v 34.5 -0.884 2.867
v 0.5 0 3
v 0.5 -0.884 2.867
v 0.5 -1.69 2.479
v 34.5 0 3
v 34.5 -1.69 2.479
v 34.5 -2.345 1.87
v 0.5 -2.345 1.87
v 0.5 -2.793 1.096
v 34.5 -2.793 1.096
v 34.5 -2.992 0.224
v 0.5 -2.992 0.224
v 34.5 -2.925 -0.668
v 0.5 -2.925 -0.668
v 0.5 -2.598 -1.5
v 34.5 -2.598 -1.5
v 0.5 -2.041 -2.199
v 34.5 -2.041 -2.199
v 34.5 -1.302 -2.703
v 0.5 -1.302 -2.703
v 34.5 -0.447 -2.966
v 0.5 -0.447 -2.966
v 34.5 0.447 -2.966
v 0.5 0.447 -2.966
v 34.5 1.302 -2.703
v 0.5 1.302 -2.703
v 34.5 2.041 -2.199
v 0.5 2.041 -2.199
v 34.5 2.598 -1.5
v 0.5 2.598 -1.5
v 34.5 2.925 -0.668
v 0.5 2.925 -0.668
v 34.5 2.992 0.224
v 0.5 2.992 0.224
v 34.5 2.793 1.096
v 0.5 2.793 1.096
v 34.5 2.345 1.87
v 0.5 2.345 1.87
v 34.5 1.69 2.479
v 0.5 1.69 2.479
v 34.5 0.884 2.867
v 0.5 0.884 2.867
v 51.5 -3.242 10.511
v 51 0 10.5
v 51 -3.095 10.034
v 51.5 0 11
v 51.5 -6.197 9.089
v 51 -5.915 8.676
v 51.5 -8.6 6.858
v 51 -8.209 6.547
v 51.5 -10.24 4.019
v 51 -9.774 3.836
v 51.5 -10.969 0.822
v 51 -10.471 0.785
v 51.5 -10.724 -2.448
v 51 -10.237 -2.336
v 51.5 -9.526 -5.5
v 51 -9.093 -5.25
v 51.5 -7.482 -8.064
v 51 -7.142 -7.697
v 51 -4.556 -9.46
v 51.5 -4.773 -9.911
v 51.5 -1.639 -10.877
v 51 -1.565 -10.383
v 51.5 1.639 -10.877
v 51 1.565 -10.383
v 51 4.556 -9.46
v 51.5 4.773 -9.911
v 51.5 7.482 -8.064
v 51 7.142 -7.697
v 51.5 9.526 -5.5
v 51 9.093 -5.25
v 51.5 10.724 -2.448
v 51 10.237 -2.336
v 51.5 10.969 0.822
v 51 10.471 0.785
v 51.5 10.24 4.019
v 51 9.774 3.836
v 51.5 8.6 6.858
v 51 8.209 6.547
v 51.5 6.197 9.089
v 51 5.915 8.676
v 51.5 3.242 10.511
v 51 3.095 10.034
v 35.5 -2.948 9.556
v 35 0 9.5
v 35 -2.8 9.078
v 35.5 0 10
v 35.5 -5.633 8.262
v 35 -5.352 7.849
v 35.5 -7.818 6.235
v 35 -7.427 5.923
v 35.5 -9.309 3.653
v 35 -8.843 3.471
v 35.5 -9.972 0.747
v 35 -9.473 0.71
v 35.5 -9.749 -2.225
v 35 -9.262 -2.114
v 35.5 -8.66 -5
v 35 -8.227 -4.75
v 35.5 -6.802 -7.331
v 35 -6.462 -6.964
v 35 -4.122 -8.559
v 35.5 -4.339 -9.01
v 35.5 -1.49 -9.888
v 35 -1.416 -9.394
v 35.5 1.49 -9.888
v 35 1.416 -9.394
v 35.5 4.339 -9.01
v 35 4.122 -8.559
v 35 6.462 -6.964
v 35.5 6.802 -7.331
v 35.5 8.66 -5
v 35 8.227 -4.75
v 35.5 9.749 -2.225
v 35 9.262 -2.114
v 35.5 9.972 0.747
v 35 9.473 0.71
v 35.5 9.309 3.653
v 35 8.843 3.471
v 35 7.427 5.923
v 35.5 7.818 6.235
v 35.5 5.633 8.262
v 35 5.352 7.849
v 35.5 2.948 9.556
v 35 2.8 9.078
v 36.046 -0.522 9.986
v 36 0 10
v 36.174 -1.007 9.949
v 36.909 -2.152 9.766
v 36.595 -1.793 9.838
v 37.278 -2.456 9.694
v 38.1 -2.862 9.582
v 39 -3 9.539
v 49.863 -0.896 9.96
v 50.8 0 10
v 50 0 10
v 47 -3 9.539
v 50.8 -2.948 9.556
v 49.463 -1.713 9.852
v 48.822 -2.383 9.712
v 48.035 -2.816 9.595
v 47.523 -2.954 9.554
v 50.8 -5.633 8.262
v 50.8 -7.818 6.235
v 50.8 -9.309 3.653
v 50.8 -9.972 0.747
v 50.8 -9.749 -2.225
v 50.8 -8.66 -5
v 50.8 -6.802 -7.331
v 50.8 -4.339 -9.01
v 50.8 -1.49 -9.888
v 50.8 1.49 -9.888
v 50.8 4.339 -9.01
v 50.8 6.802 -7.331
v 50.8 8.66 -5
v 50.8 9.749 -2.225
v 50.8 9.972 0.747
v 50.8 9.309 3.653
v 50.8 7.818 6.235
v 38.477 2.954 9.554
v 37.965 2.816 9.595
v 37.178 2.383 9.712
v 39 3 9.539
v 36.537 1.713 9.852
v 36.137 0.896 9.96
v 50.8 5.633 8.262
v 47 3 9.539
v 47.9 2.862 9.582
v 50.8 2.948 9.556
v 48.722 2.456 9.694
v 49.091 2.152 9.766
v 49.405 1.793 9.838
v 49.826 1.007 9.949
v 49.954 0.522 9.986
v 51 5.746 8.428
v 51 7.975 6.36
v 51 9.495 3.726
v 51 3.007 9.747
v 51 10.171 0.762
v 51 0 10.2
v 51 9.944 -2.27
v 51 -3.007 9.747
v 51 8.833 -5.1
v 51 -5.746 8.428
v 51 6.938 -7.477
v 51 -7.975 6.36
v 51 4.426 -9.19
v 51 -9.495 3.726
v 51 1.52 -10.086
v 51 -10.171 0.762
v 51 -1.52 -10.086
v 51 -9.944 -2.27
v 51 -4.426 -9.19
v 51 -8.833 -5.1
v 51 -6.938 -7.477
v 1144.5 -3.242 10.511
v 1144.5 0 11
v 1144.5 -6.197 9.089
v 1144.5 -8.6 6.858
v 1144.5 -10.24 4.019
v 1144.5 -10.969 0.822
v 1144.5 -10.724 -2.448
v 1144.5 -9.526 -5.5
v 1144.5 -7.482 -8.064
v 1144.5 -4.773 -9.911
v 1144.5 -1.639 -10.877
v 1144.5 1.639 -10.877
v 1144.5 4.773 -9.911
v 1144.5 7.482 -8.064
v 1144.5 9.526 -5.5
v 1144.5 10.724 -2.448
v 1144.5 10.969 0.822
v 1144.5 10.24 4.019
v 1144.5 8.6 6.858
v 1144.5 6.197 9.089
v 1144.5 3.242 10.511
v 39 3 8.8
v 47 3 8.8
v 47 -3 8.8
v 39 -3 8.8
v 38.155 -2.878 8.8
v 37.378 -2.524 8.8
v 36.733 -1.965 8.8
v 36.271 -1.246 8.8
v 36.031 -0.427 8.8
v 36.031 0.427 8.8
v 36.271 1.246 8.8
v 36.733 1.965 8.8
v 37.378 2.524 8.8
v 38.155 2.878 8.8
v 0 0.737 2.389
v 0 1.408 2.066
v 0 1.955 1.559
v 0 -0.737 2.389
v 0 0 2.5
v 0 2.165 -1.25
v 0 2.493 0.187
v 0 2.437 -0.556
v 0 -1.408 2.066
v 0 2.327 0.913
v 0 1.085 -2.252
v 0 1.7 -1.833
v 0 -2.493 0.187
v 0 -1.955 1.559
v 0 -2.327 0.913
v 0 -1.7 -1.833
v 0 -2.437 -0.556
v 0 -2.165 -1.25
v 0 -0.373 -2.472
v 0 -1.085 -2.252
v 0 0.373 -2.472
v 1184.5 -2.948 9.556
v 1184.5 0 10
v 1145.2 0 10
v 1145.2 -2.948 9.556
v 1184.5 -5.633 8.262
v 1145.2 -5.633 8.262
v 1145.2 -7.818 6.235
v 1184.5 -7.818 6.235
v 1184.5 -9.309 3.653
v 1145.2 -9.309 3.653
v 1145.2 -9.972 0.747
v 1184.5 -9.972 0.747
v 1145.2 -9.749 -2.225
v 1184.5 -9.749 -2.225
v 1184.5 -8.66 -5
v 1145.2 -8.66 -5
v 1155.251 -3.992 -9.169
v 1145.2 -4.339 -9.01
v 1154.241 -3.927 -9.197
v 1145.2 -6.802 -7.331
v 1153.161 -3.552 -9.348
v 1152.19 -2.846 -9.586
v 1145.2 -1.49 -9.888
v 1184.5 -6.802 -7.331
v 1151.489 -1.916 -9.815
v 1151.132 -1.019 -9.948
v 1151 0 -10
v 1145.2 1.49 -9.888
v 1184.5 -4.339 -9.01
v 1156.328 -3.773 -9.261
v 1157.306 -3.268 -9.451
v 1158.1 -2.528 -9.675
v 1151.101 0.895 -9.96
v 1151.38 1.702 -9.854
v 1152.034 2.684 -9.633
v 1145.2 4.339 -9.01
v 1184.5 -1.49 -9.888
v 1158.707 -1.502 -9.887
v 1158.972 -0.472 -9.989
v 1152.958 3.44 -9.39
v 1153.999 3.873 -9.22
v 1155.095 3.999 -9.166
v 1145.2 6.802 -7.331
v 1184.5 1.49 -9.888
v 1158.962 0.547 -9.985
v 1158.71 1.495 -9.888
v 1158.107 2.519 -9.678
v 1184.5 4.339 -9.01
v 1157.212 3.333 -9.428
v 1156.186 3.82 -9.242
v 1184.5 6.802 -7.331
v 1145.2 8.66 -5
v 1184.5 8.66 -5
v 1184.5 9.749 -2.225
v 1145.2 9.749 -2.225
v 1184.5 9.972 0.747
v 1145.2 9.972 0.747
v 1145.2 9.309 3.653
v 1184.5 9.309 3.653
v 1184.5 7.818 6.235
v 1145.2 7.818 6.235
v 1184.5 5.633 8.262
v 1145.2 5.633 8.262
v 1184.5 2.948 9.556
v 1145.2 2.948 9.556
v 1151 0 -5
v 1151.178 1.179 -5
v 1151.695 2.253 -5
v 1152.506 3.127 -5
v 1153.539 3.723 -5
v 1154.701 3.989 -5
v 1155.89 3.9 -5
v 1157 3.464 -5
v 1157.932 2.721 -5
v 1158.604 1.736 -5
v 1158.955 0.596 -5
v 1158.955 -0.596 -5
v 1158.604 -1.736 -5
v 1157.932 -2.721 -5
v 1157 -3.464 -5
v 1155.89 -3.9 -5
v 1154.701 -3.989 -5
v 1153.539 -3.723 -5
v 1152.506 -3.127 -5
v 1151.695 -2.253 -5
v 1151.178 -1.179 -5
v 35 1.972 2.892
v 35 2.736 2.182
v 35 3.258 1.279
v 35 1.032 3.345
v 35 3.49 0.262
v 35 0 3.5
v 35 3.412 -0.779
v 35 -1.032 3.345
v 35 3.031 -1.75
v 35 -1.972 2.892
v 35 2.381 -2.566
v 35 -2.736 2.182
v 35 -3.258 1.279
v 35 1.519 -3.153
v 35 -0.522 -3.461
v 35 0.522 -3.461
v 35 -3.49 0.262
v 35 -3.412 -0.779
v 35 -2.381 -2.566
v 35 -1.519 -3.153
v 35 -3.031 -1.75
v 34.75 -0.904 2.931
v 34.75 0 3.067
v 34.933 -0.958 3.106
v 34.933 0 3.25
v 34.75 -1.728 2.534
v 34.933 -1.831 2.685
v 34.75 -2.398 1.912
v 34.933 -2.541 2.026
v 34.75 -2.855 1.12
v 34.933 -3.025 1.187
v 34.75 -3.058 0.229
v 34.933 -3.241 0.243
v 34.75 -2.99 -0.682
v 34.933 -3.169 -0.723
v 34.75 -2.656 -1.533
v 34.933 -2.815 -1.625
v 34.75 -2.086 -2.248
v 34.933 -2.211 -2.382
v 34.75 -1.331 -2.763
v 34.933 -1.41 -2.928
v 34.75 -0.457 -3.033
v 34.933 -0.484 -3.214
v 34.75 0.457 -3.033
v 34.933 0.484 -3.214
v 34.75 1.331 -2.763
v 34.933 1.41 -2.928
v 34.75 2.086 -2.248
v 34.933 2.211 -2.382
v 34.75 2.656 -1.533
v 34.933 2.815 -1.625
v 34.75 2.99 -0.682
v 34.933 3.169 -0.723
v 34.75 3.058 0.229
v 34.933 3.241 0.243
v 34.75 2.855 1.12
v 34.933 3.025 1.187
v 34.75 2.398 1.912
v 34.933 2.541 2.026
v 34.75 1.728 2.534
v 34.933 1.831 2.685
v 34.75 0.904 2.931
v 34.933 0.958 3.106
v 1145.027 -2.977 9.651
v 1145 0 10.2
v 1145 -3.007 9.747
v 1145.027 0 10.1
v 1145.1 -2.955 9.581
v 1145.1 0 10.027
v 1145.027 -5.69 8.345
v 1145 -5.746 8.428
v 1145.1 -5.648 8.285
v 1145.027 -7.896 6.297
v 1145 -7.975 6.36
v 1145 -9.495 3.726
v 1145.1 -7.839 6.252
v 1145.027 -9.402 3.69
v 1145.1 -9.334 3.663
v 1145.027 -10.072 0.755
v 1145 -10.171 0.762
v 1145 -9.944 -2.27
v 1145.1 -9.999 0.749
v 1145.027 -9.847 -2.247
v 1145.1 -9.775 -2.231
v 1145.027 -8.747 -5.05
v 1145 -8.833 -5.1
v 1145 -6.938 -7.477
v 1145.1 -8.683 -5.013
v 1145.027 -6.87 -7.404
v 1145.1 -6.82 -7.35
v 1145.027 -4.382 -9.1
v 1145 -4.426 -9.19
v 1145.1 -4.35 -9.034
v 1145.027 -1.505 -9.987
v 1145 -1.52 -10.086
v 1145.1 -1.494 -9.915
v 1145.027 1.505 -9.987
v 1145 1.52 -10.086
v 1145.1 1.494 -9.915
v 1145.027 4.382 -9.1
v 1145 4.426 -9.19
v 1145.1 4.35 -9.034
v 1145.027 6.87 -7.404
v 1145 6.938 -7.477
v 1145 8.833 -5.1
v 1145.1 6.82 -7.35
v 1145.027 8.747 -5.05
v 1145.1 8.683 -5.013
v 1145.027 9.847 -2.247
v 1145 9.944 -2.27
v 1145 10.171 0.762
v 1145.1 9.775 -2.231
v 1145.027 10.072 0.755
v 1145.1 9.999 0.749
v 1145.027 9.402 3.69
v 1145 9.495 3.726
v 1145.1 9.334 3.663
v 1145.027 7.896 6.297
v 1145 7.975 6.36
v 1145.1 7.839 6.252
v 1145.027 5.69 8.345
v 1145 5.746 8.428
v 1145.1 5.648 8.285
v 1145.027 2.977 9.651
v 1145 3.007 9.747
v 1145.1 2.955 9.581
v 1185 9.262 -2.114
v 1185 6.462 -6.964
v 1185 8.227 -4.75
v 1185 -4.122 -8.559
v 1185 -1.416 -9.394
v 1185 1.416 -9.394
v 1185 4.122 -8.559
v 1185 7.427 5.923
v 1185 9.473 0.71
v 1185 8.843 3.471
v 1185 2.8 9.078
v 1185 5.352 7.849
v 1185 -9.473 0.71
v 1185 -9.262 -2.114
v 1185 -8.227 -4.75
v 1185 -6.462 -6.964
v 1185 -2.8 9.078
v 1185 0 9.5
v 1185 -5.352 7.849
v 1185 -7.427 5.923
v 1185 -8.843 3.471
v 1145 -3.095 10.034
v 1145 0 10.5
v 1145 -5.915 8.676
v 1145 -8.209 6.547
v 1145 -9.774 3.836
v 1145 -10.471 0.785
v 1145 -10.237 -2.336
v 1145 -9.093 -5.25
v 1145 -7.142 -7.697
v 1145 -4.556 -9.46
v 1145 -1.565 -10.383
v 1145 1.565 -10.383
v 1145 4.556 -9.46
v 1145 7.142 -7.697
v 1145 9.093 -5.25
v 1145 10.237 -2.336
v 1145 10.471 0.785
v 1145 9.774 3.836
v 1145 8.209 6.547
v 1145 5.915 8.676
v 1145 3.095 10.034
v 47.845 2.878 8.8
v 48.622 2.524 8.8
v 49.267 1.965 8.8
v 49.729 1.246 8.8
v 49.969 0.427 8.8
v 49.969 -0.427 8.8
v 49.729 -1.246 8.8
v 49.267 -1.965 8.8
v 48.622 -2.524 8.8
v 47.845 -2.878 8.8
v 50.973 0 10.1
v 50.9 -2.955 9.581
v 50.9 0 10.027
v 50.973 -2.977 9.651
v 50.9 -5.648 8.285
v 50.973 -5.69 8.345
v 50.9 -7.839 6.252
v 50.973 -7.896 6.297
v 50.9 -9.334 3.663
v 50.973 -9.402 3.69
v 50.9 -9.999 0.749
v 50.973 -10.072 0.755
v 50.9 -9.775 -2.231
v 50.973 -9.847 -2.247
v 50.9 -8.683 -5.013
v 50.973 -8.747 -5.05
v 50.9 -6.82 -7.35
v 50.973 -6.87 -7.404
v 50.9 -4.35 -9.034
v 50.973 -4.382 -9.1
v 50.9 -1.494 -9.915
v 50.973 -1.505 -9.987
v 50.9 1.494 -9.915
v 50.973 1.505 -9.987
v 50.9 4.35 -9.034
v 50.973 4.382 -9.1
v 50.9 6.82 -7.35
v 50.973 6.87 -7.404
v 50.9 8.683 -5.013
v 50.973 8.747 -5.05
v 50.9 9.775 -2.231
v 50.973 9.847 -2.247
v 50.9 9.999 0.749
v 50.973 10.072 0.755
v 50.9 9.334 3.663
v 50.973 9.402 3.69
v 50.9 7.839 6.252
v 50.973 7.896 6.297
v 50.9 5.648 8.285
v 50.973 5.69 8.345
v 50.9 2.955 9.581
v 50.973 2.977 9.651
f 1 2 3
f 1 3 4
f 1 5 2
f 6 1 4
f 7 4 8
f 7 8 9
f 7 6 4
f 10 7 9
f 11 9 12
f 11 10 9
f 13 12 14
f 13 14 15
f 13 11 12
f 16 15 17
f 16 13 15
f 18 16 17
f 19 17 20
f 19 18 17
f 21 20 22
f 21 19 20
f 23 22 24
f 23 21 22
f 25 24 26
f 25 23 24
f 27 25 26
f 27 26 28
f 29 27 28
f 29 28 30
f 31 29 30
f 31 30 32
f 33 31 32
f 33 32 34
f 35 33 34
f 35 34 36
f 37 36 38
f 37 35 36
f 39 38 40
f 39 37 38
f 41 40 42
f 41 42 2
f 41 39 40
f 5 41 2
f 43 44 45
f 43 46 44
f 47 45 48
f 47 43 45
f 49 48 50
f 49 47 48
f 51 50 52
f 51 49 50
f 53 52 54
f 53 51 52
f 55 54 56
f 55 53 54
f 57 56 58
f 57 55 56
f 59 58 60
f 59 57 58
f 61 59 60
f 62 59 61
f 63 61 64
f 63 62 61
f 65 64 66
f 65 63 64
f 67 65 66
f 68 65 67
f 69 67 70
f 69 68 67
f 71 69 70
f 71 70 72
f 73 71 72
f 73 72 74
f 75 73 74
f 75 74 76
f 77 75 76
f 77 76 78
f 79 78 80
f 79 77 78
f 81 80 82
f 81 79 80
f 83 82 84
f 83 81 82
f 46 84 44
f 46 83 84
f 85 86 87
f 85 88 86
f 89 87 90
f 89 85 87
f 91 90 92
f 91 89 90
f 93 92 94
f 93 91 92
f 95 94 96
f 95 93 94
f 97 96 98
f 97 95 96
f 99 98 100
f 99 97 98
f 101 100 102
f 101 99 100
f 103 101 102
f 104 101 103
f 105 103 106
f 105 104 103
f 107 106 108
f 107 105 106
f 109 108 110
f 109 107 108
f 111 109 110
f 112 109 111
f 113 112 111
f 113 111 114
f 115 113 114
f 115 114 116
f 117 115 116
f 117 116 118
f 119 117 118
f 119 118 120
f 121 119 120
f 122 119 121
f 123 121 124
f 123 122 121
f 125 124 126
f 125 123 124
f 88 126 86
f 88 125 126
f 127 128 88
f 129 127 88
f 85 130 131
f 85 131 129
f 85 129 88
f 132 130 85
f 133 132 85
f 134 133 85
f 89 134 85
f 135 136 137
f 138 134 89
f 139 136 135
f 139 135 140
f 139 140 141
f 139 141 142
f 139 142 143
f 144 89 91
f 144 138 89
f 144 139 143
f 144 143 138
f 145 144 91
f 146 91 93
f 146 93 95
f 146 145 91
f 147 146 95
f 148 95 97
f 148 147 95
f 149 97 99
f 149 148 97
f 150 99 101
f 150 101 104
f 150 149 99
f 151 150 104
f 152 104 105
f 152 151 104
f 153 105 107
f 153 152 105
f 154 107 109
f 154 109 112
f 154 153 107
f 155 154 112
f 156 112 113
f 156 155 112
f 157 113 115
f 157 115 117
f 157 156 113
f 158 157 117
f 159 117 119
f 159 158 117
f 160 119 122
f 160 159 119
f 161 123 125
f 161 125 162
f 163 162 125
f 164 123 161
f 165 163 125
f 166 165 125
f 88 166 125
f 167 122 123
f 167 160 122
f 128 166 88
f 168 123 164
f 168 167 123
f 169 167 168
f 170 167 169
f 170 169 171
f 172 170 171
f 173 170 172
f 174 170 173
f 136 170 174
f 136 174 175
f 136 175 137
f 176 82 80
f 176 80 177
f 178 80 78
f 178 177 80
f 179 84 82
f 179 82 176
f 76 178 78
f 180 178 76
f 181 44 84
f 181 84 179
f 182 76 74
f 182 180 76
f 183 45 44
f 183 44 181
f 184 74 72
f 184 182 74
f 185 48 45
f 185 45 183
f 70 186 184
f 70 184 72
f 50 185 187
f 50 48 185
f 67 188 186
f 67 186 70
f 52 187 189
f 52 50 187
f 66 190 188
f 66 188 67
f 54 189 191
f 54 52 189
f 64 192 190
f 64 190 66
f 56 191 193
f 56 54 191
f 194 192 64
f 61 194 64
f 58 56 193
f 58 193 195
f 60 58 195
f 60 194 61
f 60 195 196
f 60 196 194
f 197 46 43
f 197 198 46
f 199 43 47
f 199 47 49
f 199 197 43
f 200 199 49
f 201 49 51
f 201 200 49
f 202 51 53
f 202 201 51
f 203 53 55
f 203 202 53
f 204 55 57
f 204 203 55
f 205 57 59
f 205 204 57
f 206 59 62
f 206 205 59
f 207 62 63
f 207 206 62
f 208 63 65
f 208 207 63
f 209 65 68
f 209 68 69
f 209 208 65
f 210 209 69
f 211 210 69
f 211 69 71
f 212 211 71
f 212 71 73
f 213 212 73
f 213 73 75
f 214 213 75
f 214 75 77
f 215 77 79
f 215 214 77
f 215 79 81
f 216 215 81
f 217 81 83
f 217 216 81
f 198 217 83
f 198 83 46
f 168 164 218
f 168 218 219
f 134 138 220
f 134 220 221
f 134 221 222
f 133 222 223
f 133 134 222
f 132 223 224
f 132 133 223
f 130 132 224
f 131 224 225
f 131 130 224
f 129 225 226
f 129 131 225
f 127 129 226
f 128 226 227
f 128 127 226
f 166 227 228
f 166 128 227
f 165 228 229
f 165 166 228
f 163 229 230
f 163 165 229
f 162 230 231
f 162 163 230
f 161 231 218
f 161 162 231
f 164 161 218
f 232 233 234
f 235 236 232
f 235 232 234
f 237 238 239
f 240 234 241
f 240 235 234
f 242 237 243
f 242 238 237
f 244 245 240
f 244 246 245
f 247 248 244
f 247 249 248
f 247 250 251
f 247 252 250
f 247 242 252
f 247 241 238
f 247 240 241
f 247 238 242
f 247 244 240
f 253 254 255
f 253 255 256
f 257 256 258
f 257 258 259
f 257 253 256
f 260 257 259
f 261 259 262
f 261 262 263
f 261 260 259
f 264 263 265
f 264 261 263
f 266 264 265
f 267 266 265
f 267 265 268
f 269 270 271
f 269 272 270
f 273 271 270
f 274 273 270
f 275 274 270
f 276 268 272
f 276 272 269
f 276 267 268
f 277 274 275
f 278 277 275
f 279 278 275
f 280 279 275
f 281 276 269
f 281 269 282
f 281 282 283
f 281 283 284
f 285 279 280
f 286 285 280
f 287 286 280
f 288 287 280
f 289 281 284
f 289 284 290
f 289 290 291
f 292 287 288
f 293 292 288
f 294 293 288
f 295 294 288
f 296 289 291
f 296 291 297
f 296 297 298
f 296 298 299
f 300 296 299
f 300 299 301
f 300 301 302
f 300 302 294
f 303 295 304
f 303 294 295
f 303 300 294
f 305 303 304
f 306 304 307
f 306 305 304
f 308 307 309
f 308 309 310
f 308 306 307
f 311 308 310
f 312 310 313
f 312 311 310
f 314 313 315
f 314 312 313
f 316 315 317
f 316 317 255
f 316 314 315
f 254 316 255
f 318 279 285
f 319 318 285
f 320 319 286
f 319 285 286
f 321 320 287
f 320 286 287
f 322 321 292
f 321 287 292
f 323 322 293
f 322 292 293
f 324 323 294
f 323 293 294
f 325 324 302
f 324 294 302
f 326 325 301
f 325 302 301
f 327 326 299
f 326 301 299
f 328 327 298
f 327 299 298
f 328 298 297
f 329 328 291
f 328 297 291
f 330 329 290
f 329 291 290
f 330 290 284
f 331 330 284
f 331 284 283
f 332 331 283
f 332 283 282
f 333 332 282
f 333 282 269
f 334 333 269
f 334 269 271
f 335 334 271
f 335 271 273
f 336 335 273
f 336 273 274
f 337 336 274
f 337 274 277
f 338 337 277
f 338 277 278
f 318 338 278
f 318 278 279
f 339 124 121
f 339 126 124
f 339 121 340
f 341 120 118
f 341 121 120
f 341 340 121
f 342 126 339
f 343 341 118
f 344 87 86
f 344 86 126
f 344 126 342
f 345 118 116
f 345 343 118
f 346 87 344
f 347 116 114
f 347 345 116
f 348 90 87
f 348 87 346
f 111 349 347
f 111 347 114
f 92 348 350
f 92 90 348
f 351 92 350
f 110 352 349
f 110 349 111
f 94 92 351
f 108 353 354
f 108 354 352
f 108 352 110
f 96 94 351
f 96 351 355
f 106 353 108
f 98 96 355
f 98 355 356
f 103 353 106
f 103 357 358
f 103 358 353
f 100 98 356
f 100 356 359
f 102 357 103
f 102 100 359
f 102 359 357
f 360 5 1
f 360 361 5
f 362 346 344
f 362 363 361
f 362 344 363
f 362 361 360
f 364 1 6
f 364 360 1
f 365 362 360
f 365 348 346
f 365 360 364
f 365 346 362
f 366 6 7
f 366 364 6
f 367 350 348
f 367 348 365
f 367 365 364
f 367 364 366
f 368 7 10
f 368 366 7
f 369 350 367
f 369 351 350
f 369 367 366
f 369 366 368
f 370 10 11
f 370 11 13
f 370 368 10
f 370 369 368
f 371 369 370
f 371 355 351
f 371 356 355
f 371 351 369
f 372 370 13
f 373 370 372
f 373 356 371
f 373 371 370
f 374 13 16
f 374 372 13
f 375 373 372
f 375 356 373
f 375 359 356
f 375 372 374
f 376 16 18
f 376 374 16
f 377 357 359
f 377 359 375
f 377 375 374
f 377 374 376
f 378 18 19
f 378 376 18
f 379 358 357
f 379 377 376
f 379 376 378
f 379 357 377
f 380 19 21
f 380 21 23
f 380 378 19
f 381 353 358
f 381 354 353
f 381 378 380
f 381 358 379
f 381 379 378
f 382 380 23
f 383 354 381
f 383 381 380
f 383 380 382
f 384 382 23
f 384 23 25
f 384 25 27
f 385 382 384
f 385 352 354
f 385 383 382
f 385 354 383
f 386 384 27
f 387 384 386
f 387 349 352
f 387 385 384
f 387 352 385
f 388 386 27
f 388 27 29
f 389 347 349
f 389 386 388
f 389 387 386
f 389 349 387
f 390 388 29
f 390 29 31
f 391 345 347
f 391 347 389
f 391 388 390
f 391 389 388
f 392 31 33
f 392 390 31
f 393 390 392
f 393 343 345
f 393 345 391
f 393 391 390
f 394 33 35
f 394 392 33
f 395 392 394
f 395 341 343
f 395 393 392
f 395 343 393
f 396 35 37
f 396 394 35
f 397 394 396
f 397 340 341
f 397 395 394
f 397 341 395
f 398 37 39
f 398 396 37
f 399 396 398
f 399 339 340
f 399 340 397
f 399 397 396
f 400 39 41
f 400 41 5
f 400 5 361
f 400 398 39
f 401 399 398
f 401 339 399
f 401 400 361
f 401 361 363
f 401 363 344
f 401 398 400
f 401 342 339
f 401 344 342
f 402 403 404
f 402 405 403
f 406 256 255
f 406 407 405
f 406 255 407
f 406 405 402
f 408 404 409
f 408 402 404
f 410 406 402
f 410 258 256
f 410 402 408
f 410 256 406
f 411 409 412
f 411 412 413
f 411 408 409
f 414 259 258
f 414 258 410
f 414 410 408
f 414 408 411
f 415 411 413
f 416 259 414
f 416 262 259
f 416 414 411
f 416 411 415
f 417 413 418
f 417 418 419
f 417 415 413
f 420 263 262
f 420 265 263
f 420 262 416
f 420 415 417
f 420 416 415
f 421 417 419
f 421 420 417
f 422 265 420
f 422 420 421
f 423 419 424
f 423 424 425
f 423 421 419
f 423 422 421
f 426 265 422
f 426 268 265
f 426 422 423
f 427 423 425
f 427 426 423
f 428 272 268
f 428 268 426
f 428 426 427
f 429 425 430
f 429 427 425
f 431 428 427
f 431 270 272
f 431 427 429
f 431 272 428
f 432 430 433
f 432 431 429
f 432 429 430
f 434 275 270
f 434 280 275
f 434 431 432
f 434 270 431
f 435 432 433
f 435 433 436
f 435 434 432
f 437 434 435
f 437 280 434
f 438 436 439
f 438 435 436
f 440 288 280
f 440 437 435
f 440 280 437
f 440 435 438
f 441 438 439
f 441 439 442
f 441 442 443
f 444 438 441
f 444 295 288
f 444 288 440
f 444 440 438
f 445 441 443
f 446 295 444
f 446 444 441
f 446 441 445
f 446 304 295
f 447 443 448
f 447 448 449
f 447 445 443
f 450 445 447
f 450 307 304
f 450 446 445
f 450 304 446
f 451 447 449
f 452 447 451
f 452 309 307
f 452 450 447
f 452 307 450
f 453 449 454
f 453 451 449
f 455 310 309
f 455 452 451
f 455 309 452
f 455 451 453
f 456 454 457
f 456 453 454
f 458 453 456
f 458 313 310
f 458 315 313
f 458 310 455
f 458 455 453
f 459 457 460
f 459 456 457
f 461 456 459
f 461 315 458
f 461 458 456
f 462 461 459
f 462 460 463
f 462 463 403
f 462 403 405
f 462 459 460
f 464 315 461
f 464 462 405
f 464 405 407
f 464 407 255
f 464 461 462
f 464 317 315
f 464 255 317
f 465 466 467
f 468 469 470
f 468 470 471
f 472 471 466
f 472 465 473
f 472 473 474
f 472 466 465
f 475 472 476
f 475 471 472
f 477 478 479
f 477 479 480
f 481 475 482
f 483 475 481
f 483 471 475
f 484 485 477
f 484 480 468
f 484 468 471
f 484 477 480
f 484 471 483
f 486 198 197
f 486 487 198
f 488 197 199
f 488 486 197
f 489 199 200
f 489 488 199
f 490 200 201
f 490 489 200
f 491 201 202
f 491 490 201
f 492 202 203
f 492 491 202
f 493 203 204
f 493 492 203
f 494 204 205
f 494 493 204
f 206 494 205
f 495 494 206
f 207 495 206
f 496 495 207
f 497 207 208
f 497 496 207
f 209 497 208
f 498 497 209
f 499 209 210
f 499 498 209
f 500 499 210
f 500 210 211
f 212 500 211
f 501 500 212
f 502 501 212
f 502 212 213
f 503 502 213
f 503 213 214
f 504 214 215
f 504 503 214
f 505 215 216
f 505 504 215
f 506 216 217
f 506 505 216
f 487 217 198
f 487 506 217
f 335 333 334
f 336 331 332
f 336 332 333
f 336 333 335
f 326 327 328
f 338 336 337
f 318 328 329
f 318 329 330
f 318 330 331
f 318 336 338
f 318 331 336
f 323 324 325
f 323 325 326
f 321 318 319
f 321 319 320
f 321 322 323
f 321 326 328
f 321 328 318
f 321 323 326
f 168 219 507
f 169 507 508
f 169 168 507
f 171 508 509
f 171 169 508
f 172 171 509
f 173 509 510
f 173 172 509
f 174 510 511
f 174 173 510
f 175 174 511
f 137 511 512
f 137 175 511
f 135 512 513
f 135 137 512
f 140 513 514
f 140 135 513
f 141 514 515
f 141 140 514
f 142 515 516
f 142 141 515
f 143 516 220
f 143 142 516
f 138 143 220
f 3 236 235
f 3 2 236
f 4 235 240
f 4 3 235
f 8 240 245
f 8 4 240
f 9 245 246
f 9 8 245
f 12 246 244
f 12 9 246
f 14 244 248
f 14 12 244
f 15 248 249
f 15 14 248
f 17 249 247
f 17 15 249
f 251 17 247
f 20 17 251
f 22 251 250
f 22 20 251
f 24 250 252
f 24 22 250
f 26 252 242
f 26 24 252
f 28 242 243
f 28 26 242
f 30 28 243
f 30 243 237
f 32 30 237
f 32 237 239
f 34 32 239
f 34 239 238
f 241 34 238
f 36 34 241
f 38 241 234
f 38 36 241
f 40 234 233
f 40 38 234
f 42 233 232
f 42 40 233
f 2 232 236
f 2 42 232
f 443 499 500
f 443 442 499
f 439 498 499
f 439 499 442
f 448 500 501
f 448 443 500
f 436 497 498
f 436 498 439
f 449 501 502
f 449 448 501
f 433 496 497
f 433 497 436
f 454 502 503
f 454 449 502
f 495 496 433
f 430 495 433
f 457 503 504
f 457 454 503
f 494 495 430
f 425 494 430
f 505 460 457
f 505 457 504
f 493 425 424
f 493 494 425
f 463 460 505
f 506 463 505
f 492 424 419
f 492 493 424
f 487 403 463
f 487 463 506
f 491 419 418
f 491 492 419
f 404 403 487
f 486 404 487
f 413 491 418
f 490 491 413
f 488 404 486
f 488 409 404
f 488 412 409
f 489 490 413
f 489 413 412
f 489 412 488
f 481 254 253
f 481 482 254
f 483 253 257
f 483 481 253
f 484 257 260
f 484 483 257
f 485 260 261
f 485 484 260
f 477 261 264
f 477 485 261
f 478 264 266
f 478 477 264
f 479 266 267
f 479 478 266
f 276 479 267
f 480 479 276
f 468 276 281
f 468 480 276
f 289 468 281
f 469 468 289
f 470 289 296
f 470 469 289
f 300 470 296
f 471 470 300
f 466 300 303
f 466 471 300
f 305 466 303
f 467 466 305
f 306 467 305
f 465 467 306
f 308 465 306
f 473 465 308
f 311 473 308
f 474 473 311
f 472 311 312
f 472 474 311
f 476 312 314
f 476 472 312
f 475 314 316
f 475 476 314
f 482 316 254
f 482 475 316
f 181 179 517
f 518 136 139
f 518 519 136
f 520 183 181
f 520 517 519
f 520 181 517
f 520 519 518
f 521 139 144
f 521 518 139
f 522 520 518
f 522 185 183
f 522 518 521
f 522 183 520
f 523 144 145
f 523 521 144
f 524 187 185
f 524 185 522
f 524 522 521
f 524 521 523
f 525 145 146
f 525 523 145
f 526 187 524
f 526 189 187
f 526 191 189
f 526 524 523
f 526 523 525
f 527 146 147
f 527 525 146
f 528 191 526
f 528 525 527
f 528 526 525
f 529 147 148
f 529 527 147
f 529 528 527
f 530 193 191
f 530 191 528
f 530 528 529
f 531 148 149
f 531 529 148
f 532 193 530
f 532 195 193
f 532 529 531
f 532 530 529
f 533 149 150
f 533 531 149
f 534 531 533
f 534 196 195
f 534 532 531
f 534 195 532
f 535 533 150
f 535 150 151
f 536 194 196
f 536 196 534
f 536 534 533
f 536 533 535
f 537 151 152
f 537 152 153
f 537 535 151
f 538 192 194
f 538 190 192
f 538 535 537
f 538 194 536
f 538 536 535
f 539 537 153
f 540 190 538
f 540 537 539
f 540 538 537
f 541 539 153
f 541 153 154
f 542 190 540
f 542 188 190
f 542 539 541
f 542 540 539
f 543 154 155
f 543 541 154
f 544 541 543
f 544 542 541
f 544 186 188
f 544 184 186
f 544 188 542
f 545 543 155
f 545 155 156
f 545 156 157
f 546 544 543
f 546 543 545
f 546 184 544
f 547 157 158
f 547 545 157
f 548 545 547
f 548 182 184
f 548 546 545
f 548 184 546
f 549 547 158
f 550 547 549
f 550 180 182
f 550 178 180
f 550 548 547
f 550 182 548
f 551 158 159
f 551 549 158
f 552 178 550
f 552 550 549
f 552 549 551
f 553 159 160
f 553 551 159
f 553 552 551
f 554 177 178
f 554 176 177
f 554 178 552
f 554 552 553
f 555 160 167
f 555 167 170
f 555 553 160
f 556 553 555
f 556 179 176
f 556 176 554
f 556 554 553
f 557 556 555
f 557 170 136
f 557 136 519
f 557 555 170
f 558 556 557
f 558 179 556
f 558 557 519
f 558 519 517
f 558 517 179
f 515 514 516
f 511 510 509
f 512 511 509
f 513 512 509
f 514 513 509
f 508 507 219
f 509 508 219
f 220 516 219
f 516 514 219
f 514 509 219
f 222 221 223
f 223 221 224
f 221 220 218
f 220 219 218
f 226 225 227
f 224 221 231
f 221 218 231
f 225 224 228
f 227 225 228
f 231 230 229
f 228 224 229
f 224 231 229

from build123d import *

# Parameters (mm, degrees)
CUT_EXTRUDE_1_DEPTH = 1.2
SKETCH_5_R          = 4
CUT_EXTRUDE_2_DEPTH = 5


with BuildPart() as part:
    # Эскиз1 → Повернуть1 (revolve)
    with BuildSketch(Plane.XY):
        with BuildLine():
            Line((0, 2.5), (0, 0))
            Line((0, 0), (720.314175827, 0))
            Line((720.314175827, 0), (1185, 0))
            Line((1185, 0), (1185, 9.5))
            Line((1185, 9.5), (1184.5, 10))
            Line((1184.5, 10), (1145.2, 10))
            ThreePointArc((1145.2, 10), (1145.058578644, 10.058578644), (1145, 10.2))
            Line((1145, 10.2), (1145, 10.5))
            Line((1145, 10.5), (1144.5, 11))
            Line((1144.5, 11), (51.5, 11))
            Line((51.5, 11), (51, 10.5))
            Line((51, 10.5), (51, 10.2))
            ThreePointArc((51, 10.2), (50.941421356, 10.058578644), (50.8, 10))
            Line((50.8, 10), (35.5, 10))
            Line((35.5, 10), (35, 9.5))
            Line((35, 9.5), (35, 3.5))
            ThreePointArc((35, 3.5), (34.853553391, 3.146446609), (34.5, 3))
            Line((34.5, 3), (0.5, 3))
            Line((0.5, 3), (0, 2.5))
        make_face()
    revolve(axis=Axis((0, 0, 0), (1, 0, 0)))

    # Эскиз3 → Вырез-Вытянуть1 (cut)
    with BuildSketch(Plane.XY.offset(10)):
        with BuildLine():
            Line((39, 3), (47, 3))
            ThreePointArc((47, 3), (50, 0), (47, -3))
            Line((47, -3), (39, -3))
            ThreePointArc((39, -3), (36, 0), (39, 3))
        make_face()
    extrude(amount=-CUT_EXTRUDE_1_DEPTH, mode=Mode.SUBTRACT)

    # Эскиз5 → Вырез-Вытянуть2 (cut)
    with BuildSketch(Plane(origin=(0, 0, -10), x_dir=(-1, 0, 0), z_dir=(0, 0, -1))):
        with Locations((-1155, 0)):
            Circle(SKETCH_5_R)
    extrude(amount=-CUT_EXTRUDE_2_DEPTH, mode=Mode.SUBTRACT)


solid = part.part
